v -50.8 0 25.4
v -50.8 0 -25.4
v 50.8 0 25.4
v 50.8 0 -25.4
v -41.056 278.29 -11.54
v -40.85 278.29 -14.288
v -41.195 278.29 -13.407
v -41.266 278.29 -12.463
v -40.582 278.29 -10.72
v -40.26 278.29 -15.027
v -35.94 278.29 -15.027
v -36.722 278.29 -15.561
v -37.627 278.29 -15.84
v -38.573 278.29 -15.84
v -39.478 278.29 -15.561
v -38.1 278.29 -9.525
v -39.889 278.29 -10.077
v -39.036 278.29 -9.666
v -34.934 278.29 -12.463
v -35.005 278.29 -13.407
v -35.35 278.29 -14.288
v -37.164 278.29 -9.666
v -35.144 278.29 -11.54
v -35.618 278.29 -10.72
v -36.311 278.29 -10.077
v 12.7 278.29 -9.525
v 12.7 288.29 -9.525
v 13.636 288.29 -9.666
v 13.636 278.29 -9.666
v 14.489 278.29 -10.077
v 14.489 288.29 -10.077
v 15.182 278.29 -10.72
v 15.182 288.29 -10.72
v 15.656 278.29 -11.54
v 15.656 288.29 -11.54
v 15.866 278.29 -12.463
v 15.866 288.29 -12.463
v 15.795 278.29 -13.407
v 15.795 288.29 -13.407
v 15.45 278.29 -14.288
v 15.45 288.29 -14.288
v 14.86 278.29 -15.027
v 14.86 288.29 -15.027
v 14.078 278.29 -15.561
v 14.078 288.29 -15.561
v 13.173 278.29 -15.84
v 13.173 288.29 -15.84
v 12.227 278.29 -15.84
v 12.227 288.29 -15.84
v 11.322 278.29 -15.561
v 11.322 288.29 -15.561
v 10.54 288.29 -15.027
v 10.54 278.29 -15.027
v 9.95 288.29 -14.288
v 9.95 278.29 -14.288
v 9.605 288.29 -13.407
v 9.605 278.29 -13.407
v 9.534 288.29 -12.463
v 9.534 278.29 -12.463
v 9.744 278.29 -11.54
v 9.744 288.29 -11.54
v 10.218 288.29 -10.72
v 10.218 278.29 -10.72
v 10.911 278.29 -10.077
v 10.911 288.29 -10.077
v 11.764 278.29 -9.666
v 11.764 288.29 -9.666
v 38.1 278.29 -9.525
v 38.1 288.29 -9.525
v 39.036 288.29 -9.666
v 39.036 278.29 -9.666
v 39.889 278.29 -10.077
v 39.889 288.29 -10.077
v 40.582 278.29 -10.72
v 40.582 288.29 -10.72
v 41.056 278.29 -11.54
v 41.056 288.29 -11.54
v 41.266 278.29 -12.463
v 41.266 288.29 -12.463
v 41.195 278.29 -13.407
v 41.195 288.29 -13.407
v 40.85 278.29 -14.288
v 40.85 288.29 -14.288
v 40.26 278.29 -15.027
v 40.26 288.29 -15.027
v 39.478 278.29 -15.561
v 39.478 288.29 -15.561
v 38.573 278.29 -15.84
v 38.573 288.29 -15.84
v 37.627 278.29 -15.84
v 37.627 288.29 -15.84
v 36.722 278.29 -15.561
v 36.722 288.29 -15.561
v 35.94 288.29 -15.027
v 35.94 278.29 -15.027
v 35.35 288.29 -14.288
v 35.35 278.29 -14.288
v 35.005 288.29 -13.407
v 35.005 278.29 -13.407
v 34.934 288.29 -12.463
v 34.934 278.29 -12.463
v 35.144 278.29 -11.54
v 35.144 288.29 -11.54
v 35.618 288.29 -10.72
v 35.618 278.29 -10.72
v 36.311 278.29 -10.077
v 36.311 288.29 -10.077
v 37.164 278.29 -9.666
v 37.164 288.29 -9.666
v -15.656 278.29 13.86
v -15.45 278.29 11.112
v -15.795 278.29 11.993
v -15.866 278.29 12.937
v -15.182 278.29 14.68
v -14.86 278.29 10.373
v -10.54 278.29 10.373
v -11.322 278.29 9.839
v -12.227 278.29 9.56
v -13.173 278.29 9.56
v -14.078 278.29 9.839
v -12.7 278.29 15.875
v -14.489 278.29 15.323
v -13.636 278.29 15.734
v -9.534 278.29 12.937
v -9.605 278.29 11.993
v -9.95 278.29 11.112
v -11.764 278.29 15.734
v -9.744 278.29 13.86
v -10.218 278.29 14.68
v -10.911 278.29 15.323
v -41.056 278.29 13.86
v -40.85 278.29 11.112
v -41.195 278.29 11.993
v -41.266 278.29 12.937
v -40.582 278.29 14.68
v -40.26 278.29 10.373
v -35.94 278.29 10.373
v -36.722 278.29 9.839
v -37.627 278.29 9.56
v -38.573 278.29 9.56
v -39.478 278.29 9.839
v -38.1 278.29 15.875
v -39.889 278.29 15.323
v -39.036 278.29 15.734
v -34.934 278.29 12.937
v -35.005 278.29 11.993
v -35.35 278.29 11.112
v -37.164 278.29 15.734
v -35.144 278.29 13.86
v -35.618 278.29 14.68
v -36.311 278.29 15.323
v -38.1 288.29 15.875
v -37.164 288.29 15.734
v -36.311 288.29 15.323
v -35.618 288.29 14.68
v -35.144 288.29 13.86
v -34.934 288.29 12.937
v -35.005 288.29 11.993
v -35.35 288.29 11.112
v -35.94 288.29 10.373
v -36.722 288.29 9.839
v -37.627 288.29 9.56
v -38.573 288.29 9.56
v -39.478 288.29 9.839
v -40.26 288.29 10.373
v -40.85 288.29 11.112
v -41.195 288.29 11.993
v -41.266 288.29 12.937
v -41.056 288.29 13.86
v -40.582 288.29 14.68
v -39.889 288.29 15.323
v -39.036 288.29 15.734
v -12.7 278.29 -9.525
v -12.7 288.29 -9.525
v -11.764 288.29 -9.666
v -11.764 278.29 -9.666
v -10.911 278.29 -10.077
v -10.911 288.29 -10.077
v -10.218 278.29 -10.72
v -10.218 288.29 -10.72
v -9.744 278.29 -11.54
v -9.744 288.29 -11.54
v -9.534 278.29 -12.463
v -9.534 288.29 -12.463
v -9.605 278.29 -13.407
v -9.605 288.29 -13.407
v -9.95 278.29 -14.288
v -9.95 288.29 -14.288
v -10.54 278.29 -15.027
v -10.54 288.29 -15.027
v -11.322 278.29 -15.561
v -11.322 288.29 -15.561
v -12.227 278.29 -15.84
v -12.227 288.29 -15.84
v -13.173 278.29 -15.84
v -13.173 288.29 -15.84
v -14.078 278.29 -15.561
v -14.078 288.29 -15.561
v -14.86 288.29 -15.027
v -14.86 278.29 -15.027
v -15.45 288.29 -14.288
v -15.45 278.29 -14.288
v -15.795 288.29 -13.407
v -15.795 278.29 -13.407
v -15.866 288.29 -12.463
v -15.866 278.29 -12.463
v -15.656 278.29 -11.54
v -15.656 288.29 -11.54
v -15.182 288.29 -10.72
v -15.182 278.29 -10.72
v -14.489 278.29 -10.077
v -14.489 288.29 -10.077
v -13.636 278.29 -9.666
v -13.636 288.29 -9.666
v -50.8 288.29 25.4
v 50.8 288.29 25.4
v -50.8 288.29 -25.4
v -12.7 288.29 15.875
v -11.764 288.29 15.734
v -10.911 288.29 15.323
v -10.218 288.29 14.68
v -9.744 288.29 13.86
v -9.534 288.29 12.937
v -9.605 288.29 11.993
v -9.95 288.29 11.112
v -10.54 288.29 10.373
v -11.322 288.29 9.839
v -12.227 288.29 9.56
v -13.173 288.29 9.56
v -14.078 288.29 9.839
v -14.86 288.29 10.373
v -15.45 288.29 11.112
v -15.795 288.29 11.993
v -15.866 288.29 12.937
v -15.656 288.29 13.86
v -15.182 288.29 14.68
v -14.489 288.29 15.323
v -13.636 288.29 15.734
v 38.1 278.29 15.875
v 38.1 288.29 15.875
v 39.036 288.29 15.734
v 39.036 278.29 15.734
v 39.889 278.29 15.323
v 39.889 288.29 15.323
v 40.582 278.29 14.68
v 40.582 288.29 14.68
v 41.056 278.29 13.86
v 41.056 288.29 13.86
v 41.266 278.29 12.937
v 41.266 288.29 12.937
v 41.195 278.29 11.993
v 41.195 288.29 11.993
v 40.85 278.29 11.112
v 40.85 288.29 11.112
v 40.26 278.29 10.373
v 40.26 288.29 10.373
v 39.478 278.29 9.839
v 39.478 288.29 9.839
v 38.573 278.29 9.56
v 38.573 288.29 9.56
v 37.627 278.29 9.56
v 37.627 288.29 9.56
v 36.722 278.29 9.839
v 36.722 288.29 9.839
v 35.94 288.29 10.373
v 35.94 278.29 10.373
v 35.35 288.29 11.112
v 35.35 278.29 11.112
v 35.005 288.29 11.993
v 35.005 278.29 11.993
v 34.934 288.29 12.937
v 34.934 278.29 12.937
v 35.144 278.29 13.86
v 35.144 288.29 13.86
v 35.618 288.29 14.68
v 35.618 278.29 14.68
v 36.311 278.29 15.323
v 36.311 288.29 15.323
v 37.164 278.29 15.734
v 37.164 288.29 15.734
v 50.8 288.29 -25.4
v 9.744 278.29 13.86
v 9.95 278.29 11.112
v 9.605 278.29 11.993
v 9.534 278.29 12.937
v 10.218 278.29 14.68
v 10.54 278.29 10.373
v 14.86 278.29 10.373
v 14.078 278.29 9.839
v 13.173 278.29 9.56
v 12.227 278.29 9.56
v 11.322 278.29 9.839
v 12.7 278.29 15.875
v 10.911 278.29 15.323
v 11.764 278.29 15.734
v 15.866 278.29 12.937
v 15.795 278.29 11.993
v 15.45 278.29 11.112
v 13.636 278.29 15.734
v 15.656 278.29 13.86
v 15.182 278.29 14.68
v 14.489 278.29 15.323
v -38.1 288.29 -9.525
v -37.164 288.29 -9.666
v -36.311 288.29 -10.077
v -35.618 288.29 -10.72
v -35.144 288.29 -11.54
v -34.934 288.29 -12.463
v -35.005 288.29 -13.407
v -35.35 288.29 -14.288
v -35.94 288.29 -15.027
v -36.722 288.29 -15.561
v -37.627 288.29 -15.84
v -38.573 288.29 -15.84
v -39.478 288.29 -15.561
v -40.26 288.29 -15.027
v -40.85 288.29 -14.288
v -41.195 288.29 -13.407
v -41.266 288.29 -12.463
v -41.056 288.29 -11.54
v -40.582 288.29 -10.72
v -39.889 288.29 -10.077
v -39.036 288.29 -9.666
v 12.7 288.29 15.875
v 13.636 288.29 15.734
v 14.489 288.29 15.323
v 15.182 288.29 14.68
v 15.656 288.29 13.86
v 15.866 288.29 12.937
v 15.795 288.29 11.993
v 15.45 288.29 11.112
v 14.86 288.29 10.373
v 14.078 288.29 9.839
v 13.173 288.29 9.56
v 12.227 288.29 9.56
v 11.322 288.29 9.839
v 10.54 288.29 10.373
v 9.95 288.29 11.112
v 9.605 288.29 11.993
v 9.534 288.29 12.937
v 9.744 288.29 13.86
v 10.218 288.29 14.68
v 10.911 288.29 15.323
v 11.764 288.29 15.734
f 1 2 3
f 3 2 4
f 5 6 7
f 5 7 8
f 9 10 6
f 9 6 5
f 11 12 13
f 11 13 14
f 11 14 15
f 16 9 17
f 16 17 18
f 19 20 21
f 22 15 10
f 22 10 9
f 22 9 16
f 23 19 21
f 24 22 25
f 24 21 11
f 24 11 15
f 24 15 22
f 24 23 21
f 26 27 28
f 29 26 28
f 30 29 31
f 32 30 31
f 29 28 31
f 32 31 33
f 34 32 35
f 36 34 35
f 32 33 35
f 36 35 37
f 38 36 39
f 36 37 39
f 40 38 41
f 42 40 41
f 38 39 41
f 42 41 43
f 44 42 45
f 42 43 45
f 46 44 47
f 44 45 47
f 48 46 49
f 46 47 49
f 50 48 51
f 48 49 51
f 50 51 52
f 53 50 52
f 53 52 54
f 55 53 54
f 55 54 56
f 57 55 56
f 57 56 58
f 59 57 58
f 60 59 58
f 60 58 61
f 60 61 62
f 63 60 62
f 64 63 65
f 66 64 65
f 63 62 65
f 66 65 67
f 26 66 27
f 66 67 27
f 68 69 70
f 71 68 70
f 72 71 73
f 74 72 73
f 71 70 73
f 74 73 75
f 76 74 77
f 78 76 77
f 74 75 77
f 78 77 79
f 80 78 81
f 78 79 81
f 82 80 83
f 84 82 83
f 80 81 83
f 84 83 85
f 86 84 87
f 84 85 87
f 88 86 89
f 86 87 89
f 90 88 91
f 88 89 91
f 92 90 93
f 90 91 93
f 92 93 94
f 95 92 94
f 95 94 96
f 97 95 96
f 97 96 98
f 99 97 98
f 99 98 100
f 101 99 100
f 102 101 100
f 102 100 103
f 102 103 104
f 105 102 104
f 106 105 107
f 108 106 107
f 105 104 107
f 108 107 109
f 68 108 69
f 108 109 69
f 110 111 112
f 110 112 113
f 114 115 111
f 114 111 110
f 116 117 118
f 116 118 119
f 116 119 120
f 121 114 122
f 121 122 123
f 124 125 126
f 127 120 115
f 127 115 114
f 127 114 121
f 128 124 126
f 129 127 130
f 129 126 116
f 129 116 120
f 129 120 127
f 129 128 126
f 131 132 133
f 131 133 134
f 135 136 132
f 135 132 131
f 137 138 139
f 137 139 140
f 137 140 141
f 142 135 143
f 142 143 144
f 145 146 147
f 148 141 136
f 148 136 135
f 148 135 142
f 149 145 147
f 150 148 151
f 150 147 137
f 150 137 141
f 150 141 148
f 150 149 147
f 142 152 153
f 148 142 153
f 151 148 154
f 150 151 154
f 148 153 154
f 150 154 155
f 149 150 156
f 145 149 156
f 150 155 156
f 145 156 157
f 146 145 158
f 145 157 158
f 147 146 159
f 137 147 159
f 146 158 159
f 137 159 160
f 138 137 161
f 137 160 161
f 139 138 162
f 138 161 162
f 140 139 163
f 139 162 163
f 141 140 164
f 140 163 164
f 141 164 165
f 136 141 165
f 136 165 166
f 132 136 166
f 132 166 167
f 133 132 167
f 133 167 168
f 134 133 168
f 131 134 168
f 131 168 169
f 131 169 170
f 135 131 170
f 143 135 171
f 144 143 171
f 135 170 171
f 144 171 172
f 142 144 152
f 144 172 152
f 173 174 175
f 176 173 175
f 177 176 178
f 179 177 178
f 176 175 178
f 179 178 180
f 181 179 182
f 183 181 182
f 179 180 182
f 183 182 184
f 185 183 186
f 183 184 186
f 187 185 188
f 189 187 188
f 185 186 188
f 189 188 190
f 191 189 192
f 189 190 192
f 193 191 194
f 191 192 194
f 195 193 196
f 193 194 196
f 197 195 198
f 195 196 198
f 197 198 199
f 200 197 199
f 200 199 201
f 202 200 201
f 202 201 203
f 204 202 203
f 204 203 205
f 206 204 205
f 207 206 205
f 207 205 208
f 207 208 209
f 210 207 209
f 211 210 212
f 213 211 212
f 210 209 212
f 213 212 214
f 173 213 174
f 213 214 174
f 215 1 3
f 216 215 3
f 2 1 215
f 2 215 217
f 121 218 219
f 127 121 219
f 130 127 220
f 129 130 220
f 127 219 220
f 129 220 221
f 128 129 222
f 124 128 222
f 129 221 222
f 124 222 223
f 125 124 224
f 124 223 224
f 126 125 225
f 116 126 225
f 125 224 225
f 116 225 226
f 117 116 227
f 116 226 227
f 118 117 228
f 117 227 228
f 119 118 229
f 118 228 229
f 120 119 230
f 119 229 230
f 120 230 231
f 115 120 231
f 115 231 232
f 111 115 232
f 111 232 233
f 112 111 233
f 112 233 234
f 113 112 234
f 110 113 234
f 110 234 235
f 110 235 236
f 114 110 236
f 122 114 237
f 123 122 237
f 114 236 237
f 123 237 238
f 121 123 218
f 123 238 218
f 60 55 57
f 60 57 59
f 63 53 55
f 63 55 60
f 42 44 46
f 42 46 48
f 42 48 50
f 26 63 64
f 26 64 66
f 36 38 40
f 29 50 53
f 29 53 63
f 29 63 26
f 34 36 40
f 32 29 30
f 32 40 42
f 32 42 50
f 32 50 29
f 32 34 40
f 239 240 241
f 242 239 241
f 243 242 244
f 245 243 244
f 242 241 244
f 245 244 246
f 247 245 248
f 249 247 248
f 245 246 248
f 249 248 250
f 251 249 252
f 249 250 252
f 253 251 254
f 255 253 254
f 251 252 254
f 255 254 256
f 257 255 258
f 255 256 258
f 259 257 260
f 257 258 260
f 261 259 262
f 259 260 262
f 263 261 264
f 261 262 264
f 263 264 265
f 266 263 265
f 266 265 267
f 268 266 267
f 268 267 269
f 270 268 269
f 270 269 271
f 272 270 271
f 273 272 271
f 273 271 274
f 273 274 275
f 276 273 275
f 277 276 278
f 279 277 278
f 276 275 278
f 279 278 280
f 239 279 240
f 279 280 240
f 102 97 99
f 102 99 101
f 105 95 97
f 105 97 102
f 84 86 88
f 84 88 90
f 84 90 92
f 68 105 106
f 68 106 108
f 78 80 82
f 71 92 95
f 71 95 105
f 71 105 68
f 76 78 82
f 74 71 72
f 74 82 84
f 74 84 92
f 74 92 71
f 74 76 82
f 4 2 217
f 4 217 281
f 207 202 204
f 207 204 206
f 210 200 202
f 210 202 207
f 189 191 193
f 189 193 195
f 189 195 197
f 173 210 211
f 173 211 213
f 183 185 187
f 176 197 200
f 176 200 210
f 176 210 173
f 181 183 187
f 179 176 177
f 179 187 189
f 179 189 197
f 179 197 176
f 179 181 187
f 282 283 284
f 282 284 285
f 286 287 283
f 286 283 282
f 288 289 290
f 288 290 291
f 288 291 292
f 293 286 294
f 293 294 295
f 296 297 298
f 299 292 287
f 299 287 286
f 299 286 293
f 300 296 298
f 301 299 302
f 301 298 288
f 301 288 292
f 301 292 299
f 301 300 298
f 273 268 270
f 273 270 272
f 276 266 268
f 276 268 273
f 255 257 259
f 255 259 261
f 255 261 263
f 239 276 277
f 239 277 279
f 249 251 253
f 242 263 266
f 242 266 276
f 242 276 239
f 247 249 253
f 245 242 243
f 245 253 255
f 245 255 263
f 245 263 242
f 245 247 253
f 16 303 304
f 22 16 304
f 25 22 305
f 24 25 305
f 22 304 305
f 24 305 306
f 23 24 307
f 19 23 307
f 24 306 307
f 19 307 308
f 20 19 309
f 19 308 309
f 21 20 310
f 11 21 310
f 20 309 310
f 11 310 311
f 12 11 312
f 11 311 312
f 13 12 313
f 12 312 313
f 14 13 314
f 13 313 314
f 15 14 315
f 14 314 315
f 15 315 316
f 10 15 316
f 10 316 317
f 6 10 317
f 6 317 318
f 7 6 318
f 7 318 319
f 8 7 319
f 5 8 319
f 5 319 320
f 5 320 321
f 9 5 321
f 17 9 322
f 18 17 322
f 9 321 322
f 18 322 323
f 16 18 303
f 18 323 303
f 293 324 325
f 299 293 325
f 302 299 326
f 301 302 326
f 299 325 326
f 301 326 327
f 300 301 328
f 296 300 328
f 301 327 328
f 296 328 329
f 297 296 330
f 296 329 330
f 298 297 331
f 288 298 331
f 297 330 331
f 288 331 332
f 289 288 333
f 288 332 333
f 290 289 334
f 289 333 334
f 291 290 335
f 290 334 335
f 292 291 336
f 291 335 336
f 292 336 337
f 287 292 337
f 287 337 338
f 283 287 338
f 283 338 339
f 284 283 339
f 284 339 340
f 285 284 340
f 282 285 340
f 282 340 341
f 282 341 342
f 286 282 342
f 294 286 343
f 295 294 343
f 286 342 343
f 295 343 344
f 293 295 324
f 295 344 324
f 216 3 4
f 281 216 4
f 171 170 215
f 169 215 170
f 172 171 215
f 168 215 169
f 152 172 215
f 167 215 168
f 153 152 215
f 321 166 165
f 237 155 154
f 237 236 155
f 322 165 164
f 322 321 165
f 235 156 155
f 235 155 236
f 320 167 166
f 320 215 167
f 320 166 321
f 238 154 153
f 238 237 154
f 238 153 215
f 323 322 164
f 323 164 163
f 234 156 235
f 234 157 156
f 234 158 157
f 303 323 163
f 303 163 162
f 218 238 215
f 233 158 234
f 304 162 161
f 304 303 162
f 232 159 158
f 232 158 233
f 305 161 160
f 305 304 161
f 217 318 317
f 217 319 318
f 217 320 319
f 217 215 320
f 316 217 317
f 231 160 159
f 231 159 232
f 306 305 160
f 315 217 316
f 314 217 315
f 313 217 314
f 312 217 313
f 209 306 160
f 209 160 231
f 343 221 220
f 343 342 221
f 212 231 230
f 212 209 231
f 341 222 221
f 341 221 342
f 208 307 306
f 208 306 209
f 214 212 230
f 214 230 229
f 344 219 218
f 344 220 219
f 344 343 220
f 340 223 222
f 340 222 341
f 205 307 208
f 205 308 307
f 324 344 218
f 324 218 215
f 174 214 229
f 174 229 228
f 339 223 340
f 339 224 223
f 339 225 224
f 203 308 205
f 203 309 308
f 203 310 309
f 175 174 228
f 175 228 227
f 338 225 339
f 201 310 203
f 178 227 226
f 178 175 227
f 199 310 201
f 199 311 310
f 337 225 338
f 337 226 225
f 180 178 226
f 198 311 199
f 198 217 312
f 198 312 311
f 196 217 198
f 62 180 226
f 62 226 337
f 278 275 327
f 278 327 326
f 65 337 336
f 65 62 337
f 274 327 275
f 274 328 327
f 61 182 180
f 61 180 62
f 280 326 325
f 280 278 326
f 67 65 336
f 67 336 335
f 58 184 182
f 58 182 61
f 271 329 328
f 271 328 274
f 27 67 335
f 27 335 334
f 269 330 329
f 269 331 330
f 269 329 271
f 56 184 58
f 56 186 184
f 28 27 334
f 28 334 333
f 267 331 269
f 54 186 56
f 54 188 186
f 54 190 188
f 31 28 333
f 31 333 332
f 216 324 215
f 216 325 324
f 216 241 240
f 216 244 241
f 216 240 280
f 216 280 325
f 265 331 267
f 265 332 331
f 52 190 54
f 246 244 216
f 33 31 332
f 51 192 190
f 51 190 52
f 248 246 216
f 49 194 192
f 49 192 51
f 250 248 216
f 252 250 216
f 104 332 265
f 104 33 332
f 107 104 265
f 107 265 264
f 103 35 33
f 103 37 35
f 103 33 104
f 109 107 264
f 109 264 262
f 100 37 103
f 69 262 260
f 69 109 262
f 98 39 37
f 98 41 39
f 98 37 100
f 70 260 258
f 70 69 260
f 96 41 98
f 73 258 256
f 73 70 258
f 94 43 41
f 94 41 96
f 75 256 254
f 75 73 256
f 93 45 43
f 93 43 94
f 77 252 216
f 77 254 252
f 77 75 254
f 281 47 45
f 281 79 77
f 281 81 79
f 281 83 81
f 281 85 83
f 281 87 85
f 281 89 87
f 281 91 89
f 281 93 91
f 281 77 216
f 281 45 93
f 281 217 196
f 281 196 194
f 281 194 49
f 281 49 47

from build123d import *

# Parameters (mm, degrees)
SKETCH1_W            = 101.6
SKETCH1_H            = 50.8
BOSS_EXTRUDE1_DEPTH  = 288.29
SKETCH3_R            = 3.175
CUT_EXTRUDE1_DEPTH   = 10
LPATTERN1_COUNT      = 4
LPATTERN1_PITCH      = 25.4
LPATTERN1_COUNT_DIR2 = 2
LPATTERN1_PITCH_DIR2 = 25.4


with BuildPart() as part:
    # Sketch1 → Boss-Extrude1 (new body)
    with BuildSketch(Plane(origin=(0, 0, 0), x_dir=(1, 0, 0), z_dir=(0, 1, 0))):
        Rectangle(SKETCH1_W, SKETCH1_H)
    extrude(amount=BOSS_EXTRUDE1_DEPTH)

    # Sketch3 → Cut-Extrude1 (cut)
    with BuildSketch(Plane(origin=(0, 288.29, 0), x_dir=(1, 0, 0), z_dir=(0, 1, 0))):
        with Locations(Location((-38.1, 12.7, 0), (0, 0, 270))):
            Circle(SKETCH3_R)
    cut_extrude1 = extrude(amount=-CUT_EXTRUDE1_DEPTH, mode=Mode.SUBTRACT)

    # LPattern1: Cut-Extrude1 4 × 2
    with Locations(*[(i * LPATTERN1_PITCH, 0, j * LPATTERN1_PITCH_DIR2) for i in range(LPATTERN1_COUNT) for j in range(LPATTERN1_COUNT_DIR2) if (i, j) != (0, 0)]):
        add(cut_extrude1, mode=Mode.SUBTRACT)


solid = part.part
